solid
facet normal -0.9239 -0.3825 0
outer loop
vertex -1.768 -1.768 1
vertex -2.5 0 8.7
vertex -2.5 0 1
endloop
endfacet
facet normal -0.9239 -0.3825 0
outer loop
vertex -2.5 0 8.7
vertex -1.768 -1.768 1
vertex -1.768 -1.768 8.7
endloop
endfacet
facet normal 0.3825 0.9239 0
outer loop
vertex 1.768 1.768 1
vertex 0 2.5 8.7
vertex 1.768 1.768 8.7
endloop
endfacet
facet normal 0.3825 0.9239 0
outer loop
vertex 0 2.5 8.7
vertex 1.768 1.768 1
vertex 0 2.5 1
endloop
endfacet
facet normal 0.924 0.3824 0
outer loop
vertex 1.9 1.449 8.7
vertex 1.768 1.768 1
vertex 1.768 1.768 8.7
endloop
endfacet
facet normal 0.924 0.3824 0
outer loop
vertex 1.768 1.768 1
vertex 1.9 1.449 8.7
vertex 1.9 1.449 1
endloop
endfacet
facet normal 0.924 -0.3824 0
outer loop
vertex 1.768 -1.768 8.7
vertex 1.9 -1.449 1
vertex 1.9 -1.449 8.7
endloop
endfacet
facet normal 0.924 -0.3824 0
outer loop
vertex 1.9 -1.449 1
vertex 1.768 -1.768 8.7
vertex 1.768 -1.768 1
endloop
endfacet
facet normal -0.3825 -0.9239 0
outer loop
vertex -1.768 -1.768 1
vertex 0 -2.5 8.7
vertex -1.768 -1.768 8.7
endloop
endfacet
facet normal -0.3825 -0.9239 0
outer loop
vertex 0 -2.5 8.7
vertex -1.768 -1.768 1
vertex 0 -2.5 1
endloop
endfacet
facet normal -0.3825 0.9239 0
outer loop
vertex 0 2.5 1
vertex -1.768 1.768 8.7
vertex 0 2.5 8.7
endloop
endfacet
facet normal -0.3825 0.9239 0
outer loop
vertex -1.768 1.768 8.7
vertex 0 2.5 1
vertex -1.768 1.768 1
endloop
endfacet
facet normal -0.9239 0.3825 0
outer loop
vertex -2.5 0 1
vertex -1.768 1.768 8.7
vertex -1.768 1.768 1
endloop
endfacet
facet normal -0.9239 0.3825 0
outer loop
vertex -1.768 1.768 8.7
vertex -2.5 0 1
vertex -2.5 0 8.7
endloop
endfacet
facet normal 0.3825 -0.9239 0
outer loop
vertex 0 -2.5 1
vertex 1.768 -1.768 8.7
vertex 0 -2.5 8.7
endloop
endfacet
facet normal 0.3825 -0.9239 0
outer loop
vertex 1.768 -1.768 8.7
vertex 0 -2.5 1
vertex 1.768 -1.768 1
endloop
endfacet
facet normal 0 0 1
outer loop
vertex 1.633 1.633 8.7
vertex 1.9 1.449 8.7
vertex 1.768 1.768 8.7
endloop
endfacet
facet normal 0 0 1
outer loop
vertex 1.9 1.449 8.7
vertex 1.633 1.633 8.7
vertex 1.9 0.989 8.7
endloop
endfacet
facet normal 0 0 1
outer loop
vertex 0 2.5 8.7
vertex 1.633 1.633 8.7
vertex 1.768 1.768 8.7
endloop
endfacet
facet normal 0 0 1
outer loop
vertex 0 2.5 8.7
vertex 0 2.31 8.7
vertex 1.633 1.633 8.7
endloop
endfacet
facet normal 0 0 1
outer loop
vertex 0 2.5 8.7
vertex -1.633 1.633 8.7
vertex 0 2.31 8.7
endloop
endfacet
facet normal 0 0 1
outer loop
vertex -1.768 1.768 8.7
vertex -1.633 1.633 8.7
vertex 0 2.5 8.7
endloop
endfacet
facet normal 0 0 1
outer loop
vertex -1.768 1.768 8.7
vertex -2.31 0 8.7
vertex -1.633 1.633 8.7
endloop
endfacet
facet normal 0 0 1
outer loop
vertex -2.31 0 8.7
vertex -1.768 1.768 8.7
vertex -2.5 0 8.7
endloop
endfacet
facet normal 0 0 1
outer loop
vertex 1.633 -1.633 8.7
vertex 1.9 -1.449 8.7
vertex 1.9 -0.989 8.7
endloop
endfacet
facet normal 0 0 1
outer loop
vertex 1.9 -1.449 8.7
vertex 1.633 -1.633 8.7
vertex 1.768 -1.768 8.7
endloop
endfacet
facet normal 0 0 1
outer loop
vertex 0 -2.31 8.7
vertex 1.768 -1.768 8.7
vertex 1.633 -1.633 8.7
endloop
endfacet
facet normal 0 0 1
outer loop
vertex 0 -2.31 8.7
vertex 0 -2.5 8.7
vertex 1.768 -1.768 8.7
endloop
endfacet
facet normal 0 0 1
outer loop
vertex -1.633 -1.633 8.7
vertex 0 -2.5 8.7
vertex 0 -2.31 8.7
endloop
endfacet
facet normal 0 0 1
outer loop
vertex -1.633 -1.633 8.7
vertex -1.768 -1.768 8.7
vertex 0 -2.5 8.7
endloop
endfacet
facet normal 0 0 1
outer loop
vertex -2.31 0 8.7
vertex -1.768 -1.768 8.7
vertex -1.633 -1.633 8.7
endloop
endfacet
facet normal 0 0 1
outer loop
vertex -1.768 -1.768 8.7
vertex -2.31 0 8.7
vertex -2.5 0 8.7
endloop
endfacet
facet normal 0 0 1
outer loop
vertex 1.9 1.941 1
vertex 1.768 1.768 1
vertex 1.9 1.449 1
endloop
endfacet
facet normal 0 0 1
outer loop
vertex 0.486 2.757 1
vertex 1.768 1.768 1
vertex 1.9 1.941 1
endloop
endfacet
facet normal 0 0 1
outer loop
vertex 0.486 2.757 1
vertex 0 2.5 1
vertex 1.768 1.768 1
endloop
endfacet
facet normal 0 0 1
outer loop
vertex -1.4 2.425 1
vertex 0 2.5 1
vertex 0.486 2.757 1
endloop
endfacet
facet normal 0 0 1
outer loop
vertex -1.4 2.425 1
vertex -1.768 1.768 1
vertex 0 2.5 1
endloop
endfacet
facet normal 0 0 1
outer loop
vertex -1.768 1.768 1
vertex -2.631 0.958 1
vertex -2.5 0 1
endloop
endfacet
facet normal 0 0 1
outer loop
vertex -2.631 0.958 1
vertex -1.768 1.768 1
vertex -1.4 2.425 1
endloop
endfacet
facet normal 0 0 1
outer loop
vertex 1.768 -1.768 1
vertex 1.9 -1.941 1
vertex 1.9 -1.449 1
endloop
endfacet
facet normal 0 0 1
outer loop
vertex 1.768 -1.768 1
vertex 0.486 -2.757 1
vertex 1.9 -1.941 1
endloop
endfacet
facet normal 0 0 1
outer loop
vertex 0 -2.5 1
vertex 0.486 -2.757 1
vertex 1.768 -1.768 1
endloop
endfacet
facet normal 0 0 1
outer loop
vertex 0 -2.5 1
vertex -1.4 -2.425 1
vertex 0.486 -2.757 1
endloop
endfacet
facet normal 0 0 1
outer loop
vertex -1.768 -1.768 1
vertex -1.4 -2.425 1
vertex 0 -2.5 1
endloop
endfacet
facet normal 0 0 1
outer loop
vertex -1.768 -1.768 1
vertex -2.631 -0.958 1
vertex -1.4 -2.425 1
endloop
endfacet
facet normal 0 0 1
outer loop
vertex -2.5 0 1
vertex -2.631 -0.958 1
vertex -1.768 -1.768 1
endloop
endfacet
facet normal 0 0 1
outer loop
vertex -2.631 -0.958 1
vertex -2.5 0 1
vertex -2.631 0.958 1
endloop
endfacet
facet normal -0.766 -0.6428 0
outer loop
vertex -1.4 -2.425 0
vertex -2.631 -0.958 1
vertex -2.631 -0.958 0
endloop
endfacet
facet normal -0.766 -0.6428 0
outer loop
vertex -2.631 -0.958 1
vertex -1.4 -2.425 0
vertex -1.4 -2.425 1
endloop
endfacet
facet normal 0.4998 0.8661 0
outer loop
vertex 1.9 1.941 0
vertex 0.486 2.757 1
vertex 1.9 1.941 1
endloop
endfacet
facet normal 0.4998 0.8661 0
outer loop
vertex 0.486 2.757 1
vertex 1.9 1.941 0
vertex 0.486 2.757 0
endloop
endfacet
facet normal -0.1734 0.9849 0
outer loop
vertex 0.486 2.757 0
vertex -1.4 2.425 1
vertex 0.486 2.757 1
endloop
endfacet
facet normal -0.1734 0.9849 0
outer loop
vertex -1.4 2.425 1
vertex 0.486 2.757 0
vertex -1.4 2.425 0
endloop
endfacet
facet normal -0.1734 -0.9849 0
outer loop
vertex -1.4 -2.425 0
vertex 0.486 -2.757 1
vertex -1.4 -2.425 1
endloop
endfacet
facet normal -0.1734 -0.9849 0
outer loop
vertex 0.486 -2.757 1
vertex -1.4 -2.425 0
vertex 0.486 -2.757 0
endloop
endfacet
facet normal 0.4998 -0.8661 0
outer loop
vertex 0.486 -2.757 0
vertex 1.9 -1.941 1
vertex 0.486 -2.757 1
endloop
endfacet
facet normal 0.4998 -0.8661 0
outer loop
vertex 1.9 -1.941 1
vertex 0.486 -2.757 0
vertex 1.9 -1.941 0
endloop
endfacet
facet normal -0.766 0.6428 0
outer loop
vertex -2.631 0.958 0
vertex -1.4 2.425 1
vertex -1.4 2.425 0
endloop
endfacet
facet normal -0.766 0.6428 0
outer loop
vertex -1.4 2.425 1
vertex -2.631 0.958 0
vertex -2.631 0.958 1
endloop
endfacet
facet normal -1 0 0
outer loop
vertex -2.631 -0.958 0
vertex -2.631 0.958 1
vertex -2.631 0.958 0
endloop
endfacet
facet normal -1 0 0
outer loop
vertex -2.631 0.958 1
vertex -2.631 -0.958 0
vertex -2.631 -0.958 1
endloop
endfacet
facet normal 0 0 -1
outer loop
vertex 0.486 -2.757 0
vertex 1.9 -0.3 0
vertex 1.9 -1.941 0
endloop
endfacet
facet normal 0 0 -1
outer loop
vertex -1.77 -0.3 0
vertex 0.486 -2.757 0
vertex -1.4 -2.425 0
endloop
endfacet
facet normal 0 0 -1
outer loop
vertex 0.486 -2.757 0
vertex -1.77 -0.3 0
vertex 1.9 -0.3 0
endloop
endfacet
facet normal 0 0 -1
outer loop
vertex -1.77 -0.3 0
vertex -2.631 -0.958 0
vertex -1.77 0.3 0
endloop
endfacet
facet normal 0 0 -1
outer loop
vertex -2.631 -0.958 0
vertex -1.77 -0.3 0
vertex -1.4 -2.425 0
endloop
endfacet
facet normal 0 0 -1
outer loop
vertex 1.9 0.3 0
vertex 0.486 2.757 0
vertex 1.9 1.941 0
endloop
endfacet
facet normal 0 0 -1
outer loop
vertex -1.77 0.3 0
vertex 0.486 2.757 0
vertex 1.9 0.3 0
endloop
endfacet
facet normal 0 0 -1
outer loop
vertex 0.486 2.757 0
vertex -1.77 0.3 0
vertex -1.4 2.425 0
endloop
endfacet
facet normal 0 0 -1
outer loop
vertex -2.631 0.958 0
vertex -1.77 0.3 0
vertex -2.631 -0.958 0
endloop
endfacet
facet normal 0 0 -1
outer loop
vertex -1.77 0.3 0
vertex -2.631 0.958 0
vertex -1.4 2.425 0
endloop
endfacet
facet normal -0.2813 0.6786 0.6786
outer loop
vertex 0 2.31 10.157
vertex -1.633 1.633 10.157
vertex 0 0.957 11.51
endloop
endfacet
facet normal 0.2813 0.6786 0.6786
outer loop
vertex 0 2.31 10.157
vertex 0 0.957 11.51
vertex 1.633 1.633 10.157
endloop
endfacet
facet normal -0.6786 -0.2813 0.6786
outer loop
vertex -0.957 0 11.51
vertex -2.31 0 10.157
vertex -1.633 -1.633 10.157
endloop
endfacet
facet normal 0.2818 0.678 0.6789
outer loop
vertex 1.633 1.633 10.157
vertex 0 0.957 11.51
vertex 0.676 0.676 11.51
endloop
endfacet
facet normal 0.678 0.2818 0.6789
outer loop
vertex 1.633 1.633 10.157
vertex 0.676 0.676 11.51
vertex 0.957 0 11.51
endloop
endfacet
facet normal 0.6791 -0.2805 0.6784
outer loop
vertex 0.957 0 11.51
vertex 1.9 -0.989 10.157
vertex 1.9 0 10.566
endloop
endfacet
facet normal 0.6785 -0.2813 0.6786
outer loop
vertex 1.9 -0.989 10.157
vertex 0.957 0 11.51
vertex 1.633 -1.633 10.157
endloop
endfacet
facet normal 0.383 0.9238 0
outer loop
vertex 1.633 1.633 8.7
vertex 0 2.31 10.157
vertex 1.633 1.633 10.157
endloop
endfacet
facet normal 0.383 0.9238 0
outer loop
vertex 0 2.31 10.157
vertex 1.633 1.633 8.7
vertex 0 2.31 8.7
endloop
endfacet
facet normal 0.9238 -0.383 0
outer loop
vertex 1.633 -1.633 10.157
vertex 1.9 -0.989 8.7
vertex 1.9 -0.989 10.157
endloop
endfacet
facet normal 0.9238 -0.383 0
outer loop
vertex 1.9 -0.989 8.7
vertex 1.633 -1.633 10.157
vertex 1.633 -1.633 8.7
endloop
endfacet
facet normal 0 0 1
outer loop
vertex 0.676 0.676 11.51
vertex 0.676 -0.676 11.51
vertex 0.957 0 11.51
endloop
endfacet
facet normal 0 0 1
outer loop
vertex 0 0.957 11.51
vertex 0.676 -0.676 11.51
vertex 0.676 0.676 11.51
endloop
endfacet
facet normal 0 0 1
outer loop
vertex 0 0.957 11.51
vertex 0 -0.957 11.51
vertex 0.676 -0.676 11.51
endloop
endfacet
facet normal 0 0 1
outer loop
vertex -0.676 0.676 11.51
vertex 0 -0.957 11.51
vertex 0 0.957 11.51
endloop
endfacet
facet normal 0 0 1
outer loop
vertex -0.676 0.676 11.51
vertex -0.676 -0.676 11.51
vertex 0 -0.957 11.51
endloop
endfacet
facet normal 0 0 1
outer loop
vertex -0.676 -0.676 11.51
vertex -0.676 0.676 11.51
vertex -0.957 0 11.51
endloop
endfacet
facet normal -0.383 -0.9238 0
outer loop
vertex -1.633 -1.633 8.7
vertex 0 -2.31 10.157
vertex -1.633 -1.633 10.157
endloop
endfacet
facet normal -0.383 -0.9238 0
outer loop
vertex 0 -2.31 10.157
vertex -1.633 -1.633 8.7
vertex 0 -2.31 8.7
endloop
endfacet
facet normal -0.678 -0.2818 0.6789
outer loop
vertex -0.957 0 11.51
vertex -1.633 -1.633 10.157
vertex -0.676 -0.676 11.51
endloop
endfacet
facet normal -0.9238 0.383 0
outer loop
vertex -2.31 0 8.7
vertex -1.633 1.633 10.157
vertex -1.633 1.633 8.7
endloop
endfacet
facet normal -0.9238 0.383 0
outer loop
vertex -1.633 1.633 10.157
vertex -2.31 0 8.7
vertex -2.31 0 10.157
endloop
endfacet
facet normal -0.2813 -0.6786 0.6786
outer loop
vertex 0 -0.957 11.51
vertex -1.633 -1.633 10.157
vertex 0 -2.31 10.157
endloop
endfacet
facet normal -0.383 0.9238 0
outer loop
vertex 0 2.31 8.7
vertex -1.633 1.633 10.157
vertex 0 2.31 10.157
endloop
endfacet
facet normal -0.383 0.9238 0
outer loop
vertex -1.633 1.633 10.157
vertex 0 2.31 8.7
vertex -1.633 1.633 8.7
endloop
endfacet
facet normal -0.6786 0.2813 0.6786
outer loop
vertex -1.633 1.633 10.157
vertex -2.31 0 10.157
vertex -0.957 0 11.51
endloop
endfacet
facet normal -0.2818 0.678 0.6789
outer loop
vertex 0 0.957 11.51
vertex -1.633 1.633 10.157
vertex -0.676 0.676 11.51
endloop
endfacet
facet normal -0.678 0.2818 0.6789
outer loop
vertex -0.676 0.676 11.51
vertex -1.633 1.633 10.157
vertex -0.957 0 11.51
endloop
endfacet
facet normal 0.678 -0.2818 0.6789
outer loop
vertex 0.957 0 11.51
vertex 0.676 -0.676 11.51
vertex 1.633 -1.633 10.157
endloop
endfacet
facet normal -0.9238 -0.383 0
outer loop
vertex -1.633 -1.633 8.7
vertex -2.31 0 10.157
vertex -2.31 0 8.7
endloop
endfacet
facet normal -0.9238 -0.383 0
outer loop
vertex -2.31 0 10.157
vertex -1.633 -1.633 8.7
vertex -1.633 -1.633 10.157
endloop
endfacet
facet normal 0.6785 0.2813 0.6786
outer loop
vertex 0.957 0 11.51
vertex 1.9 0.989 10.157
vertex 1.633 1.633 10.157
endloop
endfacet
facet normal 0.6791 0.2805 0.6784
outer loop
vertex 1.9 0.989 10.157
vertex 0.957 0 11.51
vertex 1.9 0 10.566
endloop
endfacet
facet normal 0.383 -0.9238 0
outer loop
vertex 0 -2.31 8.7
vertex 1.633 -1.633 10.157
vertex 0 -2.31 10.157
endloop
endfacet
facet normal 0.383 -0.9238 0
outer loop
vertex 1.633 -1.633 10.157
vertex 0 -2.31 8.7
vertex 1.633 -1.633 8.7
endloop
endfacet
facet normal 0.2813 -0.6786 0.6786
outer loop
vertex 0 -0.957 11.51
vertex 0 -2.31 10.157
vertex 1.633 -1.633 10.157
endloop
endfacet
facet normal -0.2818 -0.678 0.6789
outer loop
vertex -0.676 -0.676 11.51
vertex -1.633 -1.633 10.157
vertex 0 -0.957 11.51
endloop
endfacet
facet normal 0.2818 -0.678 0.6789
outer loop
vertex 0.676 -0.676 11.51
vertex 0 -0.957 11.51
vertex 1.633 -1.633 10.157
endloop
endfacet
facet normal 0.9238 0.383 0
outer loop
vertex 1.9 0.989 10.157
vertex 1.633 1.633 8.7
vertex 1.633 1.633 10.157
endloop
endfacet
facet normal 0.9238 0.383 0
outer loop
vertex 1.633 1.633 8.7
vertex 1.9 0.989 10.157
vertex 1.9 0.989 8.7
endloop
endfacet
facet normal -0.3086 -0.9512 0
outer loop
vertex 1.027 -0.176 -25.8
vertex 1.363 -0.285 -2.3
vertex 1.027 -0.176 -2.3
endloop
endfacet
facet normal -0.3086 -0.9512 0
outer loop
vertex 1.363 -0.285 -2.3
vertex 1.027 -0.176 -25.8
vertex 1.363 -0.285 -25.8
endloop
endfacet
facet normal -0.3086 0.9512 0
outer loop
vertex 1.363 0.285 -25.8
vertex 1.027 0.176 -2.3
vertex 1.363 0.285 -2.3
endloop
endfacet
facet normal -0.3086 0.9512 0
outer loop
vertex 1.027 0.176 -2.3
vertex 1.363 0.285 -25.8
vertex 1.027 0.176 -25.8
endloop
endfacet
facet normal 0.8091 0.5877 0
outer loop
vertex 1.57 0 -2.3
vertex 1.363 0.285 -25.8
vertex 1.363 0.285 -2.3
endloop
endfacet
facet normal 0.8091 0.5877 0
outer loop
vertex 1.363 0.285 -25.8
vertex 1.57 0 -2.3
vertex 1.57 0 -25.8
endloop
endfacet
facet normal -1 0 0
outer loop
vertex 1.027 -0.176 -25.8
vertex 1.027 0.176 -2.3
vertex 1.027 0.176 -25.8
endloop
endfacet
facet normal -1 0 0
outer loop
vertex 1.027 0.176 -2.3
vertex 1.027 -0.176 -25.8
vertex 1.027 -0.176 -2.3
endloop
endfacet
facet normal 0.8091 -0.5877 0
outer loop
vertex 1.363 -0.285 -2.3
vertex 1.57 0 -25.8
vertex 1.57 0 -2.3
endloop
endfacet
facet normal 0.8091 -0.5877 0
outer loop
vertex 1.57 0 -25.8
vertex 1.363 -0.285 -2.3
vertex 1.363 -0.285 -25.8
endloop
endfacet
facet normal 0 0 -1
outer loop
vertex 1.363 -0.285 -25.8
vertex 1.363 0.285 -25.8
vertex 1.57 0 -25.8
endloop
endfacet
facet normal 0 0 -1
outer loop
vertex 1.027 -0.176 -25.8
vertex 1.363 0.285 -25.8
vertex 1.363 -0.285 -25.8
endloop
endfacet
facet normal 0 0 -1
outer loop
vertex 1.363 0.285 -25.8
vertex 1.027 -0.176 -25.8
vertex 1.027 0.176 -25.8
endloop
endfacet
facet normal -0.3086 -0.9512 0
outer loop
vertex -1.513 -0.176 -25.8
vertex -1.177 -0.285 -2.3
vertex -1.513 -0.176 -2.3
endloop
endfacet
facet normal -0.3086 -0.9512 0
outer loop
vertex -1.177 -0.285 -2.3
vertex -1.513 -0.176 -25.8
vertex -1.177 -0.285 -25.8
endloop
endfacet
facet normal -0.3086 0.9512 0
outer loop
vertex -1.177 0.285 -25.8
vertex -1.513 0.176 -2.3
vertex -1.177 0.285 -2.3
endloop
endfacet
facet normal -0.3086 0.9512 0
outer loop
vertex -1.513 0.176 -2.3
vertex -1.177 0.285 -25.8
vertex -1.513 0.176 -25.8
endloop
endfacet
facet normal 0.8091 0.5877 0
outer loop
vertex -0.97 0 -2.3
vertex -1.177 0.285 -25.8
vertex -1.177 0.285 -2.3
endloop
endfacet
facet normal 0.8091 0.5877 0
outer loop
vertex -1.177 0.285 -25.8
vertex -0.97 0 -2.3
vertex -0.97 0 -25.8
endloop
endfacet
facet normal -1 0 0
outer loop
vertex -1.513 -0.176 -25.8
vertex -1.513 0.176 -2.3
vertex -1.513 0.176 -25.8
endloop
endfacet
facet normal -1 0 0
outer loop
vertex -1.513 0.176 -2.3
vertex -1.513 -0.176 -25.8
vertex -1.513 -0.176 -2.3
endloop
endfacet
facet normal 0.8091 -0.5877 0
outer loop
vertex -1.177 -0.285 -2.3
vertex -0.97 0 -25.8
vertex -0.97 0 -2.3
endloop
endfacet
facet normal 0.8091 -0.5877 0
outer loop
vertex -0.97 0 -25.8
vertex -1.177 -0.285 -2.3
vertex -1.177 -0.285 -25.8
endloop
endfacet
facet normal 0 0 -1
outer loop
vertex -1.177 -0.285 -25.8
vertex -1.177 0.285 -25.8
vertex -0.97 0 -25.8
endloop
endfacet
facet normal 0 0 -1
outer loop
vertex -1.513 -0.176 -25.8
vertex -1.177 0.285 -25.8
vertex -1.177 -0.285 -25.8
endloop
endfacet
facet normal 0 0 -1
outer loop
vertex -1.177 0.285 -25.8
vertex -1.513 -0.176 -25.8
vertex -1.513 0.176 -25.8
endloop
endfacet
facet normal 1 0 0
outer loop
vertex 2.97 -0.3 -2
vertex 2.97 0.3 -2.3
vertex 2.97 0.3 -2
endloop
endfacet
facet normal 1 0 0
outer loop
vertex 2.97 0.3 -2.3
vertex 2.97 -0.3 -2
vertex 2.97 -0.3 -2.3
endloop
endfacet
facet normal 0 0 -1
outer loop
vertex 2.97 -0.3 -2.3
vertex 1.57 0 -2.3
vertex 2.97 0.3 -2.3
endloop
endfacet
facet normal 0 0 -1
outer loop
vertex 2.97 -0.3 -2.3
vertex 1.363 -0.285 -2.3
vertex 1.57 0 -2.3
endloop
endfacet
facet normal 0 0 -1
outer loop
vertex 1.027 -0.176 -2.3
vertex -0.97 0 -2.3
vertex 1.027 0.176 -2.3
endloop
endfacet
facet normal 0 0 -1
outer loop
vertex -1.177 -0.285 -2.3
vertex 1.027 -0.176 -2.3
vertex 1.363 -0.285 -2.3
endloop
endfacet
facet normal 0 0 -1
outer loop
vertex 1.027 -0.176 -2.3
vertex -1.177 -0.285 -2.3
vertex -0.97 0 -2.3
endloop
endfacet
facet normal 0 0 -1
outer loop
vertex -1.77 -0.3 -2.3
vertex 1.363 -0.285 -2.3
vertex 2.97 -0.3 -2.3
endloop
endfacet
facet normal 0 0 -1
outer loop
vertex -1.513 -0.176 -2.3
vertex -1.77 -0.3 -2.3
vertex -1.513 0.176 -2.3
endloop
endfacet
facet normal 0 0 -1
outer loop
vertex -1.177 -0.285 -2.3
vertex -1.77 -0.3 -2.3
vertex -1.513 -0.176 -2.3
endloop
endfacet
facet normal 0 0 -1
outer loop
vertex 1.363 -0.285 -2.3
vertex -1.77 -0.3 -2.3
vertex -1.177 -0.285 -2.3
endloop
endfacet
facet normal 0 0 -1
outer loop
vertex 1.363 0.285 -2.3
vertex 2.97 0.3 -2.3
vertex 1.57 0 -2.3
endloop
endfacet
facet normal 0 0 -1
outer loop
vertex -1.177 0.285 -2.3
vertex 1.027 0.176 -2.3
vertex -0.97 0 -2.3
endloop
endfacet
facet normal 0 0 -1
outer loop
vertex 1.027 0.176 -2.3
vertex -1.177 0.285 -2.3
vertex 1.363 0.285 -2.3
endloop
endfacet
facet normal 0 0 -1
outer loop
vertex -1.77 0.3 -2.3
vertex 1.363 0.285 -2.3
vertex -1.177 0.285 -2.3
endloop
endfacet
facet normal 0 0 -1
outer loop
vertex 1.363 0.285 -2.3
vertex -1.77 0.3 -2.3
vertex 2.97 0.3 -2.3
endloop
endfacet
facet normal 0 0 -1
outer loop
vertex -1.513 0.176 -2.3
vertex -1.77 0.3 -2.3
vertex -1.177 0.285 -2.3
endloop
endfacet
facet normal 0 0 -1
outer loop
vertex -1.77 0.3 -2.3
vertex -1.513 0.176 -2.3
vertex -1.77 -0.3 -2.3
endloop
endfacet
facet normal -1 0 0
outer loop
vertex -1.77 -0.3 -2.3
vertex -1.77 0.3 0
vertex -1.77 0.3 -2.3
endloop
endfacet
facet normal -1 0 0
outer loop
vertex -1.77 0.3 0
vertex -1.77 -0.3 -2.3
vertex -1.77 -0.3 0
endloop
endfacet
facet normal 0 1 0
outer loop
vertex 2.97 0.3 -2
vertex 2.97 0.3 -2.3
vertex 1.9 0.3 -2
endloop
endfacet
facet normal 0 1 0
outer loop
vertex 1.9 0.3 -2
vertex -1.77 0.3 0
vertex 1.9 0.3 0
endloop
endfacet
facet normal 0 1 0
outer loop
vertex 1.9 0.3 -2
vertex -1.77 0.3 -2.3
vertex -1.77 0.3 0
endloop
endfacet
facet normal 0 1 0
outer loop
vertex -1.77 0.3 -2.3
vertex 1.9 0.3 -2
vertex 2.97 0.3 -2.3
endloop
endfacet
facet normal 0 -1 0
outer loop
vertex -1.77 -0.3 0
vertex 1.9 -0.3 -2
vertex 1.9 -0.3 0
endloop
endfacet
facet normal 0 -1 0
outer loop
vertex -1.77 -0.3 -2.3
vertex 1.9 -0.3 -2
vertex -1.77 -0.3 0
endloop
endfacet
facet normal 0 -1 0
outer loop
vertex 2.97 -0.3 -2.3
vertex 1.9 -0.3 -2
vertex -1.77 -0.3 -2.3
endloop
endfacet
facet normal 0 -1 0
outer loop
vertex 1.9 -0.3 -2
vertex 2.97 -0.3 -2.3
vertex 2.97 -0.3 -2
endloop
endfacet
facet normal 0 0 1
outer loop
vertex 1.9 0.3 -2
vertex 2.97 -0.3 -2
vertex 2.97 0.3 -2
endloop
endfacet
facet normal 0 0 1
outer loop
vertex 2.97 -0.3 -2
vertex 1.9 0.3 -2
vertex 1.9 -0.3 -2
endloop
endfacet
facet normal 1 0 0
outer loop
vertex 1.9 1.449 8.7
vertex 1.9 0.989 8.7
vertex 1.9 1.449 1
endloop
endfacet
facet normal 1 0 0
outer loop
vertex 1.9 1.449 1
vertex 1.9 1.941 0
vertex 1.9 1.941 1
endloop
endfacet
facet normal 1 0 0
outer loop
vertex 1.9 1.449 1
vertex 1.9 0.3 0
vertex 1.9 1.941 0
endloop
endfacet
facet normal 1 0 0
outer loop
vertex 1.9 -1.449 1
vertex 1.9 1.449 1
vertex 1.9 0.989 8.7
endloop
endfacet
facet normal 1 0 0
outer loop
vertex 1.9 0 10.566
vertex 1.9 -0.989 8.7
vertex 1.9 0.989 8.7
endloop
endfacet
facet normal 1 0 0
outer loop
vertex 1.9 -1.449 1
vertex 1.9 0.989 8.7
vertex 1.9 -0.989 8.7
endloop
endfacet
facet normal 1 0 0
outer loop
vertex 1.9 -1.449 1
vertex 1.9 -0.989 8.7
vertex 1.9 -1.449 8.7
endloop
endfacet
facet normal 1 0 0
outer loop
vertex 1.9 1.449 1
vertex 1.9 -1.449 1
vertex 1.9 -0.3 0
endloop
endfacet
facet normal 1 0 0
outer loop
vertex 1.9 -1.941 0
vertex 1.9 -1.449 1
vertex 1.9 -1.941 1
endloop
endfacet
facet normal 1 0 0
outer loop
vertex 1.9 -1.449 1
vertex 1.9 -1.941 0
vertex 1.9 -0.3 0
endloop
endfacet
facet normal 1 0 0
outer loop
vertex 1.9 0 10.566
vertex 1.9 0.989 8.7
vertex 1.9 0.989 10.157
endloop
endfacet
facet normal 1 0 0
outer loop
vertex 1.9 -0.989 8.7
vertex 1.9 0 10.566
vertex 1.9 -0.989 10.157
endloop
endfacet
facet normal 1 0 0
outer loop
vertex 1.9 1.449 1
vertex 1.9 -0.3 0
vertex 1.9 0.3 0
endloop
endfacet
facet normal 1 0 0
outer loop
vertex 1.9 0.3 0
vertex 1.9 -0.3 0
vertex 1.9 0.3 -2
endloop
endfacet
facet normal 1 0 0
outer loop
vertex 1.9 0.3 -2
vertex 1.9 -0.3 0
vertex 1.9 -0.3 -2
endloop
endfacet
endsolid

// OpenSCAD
// Parameters
body_diameter = 5.0; //[2.5:10.0:0.1]
body_height = 8.5; //[4.25:17.0:0.1]
lens_dome_height = 2.0; //[1.0:4.0:0.1]
base_flange_diameter = 5.6; //[2.8:11.2:0.1]
base_flange_thickness = 1.0; //[0.5:2.0:0.1]
lead_diameter = 0.6; //[0.3:1.2:0.05]
lead_length = 25.0; //[12.5:50.0:0.5]
lead_spacing = 2.54; //[1.27:5.08:0.01]
overlap = 0.8; //[0.5:2.0:0.1]
flat_key_depth = 0.6; //[0.3:1.2:0.05]
internal_electrode_radius = 0.7; //[0.35:1.4:0.05]
internal_electrode_height = 3.0; //[1.5:6.0:0.1]
lead_bend_height = 2.0; //[1.0:6.0:0.1]
lead_bend_offset = 0.6; //[0.3:2.0:0.05]

// LED Body
module led_body() {
  translate([0, 0, base_flange_thickness + body_height/2 - overlap])
    cylinder(r=body_diameter/2, h=body_height, center=true);
}

// Base Flange
module base_flange() {
  translate([0, 0, base_flange_thickness/2])
    cylinder(r=base_flange_diameter/2, h=base_flange_thickness, center=true);
}

// Lens Dome
module lens_dome() {
  translate([0, 0, base_flange_thickness + body_height - overlap + (body_diameter/2 - lens_dome_height)])
    sphere(r=body_diameter/2, center=true);
}

// Flat Side Key
module flat_side_key() {
  translate([body_diameter/2 - flat_key_depth + body_diameter/2, 0, base_flange_thickness + (body_height + lens_dome_height)/2])
    cube([body_diameter, body_diameter, body_height + base_flange_thickness + lens_dome_height + body_diameter], center=true);
}

// Lead Anode
module lead_anode() {
  translate([lead_spacing/2, 0, -(lead_length + overlap)/2])
    cylinder(r=lead_diameter/2, h=lead_length + overlap, center=true);
}

// Lead Cathode
module lead_cathode() {
  translate([-lead_spacing/2, 0, -(lead_length + overlap)/2])
    cylinder(r=lead_diameter/2, h=lead_length + overlap, center=true);
}

// Lead Bend
module lead_bend() {
  translate([lead_bend_offset, 0, base_flange_thickness/2 - (lead_bend_height + overlap)/2])
    cube([lead_spacing + lead_diameter + 2*overlap, lead_diameter, lead_bend_height + overlap], center=true);
}

// Internal Electrode Detail
module internal_electrode_detail() {
  translate([0, 0, base_flange_thickness + internal_electrode_height/2])
    cylinder(r=internal_electrode_radius, h=internal_electrode_height, center=true);
}

// Markings Text (Placeholder)
module markings_text() {
  translate([0, 0, base_flange_thickness/2])
    cube([overlap, overlap, overlap], center=true);
}

// Complete LED
module led_complete() {
  difference() {
    union() {
      color([0.85, 0.85, 0.8]) led_body();
      color([0.85, 0.85, 0.8]) base_flange();
      color([0.85, 0.85, 0.8]) lens_dome();
      color([0.4, 0.4, 0.43]) lead_anode();
      color([0.4, 0.4, 0.43]) lead_cathode();
      color([0.4, 0.4, 0.43]) lead_bend();
      color([0.72, 0.45, 0.2]) internal_electrode_detail();
      color([0.2, 0.2, 0.2]) markings_text();
    }
    flat_side_key();
  }
}

// Render the complete LED
led_complete();
